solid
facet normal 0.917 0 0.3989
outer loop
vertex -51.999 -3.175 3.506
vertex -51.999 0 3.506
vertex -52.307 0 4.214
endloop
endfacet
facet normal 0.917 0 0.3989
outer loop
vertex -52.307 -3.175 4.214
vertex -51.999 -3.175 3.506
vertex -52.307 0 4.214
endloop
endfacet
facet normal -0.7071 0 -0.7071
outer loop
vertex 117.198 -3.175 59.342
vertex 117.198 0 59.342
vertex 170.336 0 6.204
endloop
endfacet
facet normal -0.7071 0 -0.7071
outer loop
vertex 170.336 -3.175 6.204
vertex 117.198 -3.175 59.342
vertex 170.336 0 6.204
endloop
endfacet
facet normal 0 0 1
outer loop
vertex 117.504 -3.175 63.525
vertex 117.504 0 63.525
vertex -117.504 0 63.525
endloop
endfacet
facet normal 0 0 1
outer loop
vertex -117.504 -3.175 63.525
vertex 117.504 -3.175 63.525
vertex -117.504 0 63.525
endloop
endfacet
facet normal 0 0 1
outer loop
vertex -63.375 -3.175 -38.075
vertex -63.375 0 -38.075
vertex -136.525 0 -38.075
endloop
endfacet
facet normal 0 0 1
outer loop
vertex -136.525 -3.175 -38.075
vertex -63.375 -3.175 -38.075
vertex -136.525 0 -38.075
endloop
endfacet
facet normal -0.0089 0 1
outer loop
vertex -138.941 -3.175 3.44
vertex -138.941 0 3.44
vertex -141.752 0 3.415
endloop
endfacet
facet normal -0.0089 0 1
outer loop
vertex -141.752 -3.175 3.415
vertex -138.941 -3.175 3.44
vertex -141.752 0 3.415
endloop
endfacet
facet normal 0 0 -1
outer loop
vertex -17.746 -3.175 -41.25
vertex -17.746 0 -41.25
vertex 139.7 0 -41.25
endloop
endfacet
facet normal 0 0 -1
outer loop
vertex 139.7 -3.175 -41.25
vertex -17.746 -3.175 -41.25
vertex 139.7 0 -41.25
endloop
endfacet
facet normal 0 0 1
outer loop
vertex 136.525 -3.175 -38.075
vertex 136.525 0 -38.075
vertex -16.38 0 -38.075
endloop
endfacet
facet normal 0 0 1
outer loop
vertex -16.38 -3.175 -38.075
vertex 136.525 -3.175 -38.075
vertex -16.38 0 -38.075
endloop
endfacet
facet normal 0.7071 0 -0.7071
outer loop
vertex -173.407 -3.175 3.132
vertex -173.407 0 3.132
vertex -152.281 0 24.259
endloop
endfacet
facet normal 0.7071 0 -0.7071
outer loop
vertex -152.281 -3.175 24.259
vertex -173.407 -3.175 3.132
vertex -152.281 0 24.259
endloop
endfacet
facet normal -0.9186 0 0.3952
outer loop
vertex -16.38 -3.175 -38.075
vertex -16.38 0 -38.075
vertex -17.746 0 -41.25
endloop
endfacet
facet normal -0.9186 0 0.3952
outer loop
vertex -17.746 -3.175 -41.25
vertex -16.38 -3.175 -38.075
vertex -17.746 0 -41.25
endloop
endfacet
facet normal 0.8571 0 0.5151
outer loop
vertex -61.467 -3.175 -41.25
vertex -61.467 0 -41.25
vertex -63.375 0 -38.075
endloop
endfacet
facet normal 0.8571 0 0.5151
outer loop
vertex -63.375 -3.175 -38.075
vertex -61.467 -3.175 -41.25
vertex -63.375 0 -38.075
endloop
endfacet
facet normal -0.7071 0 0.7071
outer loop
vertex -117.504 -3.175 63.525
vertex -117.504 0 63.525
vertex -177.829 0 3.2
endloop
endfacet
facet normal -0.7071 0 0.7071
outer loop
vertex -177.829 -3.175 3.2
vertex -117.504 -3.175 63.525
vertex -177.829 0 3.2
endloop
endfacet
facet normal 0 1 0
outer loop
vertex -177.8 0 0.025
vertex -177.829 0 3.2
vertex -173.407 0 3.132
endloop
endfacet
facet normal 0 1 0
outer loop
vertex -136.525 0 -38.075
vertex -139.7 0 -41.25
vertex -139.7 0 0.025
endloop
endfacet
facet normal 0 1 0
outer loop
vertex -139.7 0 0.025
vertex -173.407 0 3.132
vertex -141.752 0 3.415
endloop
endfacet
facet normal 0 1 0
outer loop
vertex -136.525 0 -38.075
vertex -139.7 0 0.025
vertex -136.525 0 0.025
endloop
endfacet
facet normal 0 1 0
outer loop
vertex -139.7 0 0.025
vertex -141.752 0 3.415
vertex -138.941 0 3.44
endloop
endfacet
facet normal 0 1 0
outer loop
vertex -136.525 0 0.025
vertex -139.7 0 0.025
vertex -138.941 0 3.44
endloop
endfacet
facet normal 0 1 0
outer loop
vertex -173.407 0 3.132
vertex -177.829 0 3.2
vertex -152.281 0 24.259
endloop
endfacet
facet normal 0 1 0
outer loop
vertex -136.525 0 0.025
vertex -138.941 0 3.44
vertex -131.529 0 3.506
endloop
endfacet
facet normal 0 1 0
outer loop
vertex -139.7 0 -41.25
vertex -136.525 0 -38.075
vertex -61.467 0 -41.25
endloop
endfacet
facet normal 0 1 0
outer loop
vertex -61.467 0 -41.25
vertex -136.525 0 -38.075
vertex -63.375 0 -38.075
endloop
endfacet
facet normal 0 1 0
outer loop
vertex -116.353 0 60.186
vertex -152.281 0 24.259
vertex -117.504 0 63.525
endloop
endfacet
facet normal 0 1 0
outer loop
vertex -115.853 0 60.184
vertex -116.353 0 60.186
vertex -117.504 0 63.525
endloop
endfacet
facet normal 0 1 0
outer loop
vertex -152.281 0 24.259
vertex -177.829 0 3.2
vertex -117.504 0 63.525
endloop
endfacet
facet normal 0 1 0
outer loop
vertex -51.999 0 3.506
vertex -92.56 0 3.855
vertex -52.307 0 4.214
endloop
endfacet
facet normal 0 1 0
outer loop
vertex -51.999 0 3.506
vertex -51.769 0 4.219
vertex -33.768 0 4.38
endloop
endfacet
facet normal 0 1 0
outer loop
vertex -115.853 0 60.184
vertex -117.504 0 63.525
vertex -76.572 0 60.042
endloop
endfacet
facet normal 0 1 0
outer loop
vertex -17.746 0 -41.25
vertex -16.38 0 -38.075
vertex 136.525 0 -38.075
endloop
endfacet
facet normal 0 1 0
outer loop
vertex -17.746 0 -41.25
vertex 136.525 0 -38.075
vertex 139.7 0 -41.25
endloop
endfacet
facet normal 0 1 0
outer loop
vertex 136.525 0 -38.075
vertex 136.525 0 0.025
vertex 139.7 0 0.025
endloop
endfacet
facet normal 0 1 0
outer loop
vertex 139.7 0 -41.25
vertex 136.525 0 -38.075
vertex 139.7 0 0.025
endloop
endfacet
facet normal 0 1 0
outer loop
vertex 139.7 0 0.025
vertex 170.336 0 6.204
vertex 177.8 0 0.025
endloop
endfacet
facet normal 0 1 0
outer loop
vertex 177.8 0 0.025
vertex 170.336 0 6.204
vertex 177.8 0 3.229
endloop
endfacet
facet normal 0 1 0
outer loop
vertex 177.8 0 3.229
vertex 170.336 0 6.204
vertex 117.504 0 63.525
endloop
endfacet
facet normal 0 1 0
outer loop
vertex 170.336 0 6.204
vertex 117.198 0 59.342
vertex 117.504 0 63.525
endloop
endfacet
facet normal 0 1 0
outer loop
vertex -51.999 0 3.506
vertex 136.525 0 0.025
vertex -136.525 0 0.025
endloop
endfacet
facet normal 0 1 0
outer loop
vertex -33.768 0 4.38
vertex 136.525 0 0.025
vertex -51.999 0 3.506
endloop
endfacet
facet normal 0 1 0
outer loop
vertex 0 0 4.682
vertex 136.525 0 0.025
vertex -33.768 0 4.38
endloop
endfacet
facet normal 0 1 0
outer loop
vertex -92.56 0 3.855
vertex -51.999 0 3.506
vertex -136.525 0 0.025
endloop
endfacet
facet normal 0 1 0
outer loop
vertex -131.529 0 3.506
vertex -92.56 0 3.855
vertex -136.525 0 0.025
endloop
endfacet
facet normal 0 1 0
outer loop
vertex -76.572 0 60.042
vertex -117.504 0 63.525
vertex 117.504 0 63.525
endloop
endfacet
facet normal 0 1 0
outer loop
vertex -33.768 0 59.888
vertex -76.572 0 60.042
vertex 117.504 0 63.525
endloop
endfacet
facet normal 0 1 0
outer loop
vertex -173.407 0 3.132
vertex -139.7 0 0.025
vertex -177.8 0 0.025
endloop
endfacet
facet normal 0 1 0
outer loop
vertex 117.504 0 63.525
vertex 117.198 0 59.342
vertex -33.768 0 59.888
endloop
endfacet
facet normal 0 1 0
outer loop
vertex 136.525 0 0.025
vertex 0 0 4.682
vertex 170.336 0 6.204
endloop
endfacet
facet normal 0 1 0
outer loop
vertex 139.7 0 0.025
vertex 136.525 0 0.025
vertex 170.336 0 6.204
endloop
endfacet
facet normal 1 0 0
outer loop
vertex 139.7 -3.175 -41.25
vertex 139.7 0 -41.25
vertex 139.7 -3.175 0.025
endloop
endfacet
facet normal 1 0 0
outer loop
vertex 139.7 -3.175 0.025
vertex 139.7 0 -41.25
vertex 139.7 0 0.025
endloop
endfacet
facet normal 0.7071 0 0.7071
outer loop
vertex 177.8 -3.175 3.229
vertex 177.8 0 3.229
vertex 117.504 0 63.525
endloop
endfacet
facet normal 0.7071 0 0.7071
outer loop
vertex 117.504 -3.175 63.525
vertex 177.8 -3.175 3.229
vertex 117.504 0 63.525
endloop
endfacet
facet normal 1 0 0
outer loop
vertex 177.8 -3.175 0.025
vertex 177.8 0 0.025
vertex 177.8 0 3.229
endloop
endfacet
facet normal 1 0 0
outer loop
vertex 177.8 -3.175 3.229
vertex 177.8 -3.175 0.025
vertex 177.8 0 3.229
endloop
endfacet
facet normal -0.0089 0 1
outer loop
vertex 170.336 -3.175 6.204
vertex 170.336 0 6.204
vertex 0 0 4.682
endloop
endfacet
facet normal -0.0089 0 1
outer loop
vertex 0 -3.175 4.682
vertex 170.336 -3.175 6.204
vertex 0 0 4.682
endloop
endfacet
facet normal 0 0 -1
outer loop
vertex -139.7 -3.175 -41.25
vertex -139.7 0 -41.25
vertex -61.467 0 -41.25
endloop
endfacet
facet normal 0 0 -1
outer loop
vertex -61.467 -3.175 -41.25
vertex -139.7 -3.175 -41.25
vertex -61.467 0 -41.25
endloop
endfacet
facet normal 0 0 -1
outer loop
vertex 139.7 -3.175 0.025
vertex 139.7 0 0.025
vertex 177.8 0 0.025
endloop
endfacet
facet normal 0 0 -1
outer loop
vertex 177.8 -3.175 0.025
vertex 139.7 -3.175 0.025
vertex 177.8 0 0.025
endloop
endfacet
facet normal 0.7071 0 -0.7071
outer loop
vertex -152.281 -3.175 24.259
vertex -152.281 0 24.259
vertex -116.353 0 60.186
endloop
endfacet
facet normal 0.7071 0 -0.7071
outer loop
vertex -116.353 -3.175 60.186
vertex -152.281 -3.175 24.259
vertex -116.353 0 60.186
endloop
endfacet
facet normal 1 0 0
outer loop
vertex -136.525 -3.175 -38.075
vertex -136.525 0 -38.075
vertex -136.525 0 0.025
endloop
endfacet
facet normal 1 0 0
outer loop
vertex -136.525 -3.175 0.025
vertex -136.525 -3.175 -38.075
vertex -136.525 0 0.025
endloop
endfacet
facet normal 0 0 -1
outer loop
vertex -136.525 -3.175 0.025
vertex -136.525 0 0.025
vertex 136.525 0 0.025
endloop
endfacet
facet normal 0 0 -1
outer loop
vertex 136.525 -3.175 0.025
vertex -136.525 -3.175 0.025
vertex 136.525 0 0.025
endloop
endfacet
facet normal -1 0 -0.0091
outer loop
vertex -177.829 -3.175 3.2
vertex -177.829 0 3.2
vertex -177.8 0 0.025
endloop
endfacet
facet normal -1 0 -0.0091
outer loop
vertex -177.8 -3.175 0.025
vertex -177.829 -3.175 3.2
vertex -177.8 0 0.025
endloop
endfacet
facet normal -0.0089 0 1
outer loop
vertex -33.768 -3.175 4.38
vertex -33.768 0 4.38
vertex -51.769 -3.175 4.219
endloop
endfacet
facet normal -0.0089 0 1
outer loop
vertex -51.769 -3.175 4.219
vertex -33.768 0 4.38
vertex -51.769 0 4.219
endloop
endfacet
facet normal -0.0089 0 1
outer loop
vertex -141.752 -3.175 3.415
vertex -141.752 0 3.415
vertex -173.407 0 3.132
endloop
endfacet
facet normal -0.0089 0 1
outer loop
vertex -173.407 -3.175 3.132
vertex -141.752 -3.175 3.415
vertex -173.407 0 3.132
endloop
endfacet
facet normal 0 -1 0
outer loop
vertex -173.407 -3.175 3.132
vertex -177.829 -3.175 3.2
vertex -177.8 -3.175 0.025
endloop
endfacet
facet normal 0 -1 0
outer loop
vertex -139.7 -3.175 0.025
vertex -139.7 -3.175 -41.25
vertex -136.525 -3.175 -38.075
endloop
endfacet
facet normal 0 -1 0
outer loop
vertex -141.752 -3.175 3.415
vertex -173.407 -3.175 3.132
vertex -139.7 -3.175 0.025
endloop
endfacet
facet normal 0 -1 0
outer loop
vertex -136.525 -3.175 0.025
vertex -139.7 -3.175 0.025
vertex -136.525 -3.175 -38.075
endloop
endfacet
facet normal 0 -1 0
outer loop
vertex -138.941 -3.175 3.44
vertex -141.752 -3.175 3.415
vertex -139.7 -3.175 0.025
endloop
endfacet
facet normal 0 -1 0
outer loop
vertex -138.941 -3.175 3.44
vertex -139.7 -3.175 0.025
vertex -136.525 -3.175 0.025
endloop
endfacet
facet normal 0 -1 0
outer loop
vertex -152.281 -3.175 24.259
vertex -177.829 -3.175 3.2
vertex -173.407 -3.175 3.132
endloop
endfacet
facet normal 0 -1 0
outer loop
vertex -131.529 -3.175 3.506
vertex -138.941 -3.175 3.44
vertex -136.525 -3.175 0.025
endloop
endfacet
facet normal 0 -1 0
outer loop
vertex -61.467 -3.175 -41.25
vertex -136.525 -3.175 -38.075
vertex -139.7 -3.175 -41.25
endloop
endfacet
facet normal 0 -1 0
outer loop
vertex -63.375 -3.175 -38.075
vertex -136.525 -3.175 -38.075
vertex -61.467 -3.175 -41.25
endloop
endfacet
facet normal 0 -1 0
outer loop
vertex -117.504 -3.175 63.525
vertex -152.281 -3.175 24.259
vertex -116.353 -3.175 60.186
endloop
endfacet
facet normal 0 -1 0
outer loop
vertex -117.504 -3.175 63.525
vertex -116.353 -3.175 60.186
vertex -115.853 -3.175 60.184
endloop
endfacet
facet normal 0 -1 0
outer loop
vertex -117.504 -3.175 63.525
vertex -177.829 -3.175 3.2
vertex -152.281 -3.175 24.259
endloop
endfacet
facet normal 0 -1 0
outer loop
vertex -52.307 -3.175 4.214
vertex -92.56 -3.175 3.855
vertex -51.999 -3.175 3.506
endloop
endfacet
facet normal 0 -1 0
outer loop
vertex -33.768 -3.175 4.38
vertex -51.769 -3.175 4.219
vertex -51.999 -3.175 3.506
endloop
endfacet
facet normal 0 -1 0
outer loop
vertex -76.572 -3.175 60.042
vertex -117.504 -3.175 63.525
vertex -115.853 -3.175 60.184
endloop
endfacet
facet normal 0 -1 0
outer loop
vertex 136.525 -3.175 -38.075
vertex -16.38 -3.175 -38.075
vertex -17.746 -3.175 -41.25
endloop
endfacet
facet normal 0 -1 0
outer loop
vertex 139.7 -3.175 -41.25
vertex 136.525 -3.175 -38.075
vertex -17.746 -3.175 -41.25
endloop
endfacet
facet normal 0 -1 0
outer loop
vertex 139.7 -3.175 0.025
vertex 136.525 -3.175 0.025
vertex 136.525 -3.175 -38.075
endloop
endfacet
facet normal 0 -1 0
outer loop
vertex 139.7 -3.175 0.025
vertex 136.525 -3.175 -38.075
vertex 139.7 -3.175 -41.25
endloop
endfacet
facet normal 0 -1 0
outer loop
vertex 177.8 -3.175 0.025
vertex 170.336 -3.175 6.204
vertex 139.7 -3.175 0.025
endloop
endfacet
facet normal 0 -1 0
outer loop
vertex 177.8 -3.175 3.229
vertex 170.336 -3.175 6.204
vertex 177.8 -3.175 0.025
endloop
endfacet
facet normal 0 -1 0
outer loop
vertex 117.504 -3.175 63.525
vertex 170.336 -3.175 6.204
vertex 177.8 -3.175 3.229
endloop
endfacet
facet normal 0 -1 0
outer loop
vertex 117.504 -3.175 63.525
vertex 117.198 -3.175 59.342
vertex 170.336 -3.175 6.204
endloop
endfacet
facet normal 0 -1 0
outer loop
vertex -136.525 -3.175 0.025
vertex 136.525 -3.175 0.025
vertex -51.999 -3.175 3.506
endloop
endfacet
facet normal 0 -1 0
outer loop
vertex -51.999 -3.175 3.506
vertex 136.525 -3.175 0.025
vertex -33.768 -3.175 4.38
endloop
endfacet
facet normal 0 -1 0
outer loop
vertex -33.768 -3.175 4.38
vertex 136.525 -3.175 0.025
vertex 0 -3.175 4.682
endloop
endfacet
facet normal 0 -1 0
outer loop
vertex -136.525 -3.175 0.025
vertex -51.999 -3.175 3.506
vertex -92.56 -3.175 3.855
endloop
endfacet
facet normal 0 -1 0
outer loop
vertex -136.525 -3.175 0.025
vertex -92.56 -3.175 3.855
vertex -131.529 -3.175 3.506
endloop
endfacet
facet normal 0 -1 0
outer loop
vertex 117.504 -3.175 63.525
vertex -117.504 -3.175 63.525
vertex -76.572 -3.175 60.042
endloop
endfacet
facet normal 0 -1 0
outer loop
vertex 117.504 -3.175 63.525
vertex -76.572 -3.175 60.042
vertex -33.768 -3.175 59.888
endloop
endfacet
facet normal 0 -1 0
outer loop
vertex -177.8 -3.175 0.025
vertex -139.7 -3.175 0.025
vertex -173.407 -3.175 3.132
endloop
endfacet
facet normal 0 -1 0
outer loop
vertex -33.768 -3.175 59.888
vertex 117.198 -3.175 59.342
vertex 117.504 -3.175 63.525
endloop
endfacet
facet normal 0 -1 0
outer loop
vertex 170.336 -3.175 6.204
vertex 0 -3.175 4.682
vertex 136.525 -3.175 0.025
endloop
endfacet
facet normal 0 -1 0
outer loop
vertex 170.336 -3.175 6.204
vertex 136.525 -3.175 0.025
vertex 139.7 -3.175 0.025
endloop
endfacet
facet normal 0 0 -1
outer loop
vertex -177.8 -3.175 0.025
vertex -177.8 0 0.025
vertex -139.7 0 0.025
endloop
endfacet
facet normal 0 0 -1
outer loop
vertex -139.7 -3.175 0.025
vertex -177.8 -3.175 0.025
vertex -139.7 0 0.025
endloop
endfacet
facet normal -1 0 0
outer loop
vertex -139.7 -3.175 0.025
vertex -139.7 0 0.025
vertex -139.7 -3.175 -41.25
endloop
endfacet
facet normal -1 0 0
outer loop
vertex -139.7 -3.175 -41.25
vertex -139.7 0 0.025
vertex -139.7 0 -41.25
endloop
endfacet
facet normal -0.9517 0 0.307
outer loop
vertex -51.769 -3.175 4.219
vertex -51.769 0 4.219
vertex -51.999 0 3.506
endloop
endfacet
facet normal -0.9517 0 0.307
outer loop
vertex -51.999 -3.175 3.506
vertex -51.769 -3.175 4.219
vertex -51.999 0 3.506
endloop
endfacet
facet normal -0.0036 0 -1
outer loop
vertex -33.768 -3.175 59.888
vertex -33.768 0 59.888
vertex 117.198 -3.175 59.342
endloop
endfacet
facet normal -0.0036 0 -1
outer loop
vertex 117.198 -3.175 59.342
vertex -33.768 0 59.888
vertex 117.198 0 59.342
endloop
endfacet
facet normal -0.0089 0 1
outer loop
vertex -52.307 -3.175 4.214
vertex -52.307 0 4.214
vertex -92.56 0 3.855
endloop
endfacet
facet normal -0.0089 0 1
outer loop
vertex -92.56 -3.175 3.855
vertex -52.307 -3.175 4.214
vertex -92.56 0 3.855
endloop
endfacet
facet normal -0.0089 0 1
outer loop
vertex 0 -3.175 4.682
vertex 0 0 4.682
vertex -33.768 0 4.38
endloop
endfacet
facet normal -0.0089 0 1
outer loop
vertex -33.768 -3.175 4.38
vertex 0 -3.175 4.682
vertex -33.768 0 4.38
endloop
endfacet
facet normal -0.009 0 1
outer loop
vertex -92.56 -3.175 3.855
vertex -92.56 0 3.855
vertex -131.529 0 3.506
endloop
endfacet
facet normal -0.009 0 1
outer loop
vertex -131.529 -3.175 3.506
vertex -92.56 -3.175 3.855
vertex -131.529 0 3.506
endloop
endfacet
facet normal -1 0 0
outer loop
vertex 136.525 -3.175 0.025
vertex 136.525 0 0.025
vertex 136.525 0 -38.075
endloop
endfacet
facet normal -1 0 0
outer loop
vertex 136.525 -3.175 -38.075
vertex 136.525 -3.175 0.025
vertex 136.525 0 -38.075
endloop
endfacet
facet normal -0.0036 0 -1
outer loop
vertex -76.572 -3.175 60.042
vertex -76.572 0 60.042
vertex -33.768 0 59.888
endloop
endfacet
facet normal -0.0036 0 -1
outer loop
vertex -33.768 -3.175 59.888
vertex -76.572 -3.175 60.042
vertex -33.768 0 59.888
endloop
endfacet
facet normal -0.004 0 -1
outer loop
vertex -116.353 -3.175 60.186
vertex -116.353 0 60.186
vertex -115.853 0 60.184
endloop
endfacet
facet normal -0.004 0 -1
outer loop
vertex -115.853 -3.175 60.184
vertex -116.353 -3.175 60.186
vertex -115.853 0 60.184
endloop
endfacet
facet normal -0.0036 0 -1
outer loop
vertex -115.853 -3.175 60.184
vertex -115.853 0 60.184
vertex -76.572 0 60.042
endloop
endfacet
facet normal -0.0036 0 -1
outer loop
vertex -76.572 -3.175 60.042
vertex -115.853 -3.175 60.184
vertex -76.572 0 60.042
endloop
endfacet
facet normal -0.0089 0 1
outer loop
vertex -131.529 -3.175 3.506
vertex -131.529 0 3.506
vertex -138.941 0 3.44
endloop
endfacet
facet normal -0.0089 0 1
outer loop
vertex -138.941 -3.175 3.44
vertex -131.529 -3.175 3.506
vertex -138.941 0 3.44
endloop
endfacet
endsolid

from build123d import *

# Parameters (mm, degrees)
F1_DEPTH = 3.175


with BuildPart() as f1:
    # F0 (on Front) → F1 (new body)
    with BuildSketch(Plane.XZ):
        Polygon((-109.02407, -38.0746), (-136.525, -38.0746), (-136.525, 0.0254), (-86.268388, 0.0254), (-38.200188, 0.0254), (136.525, 0.0254), (136.525, -38.0746), (0, -38.0746), (-16.379747, -38.0746), (-17.745636, -41.2496), (139.7, -41.2496), (139.7, 0.0254), (177.8, 0.0254), (177.8, 3.229479), (117.504079, 63.5254), (-117.504079, 63.5254), (-177.829079, 3.2004), (-177.8, 0.0254), (-139.7, 0.0254), (-139.7, -41.2496), (-61.467241, -41.2496), (-63.375022, -38.0746), (-86.524069, -38.0746), align=None)
        Polygon((-141.752446, 3.415089), (-173.407102, 3.132249), (-152.280724, 24.258627), (-116.353083, 60.186267), (-115.853459, 60.18446), (-76.571651, 60.042381), (-33.768375, 59.887564), (117.197821, 59.34153), (170.335695, 6.203656), (0, 4.681674), (-33.768375, 4.379947), (-51.768549, 4.219112), (-51.998988, 3.506442), (-52.306652, 4.214304), (-92.559852, 3.854634), (-131.528538, 3.506442), (-138.940506, 3.440214), align=None, mode=Mode.SUBTRACT)
    extrude(amount=F1_DEPTH)


solid = f1.part
